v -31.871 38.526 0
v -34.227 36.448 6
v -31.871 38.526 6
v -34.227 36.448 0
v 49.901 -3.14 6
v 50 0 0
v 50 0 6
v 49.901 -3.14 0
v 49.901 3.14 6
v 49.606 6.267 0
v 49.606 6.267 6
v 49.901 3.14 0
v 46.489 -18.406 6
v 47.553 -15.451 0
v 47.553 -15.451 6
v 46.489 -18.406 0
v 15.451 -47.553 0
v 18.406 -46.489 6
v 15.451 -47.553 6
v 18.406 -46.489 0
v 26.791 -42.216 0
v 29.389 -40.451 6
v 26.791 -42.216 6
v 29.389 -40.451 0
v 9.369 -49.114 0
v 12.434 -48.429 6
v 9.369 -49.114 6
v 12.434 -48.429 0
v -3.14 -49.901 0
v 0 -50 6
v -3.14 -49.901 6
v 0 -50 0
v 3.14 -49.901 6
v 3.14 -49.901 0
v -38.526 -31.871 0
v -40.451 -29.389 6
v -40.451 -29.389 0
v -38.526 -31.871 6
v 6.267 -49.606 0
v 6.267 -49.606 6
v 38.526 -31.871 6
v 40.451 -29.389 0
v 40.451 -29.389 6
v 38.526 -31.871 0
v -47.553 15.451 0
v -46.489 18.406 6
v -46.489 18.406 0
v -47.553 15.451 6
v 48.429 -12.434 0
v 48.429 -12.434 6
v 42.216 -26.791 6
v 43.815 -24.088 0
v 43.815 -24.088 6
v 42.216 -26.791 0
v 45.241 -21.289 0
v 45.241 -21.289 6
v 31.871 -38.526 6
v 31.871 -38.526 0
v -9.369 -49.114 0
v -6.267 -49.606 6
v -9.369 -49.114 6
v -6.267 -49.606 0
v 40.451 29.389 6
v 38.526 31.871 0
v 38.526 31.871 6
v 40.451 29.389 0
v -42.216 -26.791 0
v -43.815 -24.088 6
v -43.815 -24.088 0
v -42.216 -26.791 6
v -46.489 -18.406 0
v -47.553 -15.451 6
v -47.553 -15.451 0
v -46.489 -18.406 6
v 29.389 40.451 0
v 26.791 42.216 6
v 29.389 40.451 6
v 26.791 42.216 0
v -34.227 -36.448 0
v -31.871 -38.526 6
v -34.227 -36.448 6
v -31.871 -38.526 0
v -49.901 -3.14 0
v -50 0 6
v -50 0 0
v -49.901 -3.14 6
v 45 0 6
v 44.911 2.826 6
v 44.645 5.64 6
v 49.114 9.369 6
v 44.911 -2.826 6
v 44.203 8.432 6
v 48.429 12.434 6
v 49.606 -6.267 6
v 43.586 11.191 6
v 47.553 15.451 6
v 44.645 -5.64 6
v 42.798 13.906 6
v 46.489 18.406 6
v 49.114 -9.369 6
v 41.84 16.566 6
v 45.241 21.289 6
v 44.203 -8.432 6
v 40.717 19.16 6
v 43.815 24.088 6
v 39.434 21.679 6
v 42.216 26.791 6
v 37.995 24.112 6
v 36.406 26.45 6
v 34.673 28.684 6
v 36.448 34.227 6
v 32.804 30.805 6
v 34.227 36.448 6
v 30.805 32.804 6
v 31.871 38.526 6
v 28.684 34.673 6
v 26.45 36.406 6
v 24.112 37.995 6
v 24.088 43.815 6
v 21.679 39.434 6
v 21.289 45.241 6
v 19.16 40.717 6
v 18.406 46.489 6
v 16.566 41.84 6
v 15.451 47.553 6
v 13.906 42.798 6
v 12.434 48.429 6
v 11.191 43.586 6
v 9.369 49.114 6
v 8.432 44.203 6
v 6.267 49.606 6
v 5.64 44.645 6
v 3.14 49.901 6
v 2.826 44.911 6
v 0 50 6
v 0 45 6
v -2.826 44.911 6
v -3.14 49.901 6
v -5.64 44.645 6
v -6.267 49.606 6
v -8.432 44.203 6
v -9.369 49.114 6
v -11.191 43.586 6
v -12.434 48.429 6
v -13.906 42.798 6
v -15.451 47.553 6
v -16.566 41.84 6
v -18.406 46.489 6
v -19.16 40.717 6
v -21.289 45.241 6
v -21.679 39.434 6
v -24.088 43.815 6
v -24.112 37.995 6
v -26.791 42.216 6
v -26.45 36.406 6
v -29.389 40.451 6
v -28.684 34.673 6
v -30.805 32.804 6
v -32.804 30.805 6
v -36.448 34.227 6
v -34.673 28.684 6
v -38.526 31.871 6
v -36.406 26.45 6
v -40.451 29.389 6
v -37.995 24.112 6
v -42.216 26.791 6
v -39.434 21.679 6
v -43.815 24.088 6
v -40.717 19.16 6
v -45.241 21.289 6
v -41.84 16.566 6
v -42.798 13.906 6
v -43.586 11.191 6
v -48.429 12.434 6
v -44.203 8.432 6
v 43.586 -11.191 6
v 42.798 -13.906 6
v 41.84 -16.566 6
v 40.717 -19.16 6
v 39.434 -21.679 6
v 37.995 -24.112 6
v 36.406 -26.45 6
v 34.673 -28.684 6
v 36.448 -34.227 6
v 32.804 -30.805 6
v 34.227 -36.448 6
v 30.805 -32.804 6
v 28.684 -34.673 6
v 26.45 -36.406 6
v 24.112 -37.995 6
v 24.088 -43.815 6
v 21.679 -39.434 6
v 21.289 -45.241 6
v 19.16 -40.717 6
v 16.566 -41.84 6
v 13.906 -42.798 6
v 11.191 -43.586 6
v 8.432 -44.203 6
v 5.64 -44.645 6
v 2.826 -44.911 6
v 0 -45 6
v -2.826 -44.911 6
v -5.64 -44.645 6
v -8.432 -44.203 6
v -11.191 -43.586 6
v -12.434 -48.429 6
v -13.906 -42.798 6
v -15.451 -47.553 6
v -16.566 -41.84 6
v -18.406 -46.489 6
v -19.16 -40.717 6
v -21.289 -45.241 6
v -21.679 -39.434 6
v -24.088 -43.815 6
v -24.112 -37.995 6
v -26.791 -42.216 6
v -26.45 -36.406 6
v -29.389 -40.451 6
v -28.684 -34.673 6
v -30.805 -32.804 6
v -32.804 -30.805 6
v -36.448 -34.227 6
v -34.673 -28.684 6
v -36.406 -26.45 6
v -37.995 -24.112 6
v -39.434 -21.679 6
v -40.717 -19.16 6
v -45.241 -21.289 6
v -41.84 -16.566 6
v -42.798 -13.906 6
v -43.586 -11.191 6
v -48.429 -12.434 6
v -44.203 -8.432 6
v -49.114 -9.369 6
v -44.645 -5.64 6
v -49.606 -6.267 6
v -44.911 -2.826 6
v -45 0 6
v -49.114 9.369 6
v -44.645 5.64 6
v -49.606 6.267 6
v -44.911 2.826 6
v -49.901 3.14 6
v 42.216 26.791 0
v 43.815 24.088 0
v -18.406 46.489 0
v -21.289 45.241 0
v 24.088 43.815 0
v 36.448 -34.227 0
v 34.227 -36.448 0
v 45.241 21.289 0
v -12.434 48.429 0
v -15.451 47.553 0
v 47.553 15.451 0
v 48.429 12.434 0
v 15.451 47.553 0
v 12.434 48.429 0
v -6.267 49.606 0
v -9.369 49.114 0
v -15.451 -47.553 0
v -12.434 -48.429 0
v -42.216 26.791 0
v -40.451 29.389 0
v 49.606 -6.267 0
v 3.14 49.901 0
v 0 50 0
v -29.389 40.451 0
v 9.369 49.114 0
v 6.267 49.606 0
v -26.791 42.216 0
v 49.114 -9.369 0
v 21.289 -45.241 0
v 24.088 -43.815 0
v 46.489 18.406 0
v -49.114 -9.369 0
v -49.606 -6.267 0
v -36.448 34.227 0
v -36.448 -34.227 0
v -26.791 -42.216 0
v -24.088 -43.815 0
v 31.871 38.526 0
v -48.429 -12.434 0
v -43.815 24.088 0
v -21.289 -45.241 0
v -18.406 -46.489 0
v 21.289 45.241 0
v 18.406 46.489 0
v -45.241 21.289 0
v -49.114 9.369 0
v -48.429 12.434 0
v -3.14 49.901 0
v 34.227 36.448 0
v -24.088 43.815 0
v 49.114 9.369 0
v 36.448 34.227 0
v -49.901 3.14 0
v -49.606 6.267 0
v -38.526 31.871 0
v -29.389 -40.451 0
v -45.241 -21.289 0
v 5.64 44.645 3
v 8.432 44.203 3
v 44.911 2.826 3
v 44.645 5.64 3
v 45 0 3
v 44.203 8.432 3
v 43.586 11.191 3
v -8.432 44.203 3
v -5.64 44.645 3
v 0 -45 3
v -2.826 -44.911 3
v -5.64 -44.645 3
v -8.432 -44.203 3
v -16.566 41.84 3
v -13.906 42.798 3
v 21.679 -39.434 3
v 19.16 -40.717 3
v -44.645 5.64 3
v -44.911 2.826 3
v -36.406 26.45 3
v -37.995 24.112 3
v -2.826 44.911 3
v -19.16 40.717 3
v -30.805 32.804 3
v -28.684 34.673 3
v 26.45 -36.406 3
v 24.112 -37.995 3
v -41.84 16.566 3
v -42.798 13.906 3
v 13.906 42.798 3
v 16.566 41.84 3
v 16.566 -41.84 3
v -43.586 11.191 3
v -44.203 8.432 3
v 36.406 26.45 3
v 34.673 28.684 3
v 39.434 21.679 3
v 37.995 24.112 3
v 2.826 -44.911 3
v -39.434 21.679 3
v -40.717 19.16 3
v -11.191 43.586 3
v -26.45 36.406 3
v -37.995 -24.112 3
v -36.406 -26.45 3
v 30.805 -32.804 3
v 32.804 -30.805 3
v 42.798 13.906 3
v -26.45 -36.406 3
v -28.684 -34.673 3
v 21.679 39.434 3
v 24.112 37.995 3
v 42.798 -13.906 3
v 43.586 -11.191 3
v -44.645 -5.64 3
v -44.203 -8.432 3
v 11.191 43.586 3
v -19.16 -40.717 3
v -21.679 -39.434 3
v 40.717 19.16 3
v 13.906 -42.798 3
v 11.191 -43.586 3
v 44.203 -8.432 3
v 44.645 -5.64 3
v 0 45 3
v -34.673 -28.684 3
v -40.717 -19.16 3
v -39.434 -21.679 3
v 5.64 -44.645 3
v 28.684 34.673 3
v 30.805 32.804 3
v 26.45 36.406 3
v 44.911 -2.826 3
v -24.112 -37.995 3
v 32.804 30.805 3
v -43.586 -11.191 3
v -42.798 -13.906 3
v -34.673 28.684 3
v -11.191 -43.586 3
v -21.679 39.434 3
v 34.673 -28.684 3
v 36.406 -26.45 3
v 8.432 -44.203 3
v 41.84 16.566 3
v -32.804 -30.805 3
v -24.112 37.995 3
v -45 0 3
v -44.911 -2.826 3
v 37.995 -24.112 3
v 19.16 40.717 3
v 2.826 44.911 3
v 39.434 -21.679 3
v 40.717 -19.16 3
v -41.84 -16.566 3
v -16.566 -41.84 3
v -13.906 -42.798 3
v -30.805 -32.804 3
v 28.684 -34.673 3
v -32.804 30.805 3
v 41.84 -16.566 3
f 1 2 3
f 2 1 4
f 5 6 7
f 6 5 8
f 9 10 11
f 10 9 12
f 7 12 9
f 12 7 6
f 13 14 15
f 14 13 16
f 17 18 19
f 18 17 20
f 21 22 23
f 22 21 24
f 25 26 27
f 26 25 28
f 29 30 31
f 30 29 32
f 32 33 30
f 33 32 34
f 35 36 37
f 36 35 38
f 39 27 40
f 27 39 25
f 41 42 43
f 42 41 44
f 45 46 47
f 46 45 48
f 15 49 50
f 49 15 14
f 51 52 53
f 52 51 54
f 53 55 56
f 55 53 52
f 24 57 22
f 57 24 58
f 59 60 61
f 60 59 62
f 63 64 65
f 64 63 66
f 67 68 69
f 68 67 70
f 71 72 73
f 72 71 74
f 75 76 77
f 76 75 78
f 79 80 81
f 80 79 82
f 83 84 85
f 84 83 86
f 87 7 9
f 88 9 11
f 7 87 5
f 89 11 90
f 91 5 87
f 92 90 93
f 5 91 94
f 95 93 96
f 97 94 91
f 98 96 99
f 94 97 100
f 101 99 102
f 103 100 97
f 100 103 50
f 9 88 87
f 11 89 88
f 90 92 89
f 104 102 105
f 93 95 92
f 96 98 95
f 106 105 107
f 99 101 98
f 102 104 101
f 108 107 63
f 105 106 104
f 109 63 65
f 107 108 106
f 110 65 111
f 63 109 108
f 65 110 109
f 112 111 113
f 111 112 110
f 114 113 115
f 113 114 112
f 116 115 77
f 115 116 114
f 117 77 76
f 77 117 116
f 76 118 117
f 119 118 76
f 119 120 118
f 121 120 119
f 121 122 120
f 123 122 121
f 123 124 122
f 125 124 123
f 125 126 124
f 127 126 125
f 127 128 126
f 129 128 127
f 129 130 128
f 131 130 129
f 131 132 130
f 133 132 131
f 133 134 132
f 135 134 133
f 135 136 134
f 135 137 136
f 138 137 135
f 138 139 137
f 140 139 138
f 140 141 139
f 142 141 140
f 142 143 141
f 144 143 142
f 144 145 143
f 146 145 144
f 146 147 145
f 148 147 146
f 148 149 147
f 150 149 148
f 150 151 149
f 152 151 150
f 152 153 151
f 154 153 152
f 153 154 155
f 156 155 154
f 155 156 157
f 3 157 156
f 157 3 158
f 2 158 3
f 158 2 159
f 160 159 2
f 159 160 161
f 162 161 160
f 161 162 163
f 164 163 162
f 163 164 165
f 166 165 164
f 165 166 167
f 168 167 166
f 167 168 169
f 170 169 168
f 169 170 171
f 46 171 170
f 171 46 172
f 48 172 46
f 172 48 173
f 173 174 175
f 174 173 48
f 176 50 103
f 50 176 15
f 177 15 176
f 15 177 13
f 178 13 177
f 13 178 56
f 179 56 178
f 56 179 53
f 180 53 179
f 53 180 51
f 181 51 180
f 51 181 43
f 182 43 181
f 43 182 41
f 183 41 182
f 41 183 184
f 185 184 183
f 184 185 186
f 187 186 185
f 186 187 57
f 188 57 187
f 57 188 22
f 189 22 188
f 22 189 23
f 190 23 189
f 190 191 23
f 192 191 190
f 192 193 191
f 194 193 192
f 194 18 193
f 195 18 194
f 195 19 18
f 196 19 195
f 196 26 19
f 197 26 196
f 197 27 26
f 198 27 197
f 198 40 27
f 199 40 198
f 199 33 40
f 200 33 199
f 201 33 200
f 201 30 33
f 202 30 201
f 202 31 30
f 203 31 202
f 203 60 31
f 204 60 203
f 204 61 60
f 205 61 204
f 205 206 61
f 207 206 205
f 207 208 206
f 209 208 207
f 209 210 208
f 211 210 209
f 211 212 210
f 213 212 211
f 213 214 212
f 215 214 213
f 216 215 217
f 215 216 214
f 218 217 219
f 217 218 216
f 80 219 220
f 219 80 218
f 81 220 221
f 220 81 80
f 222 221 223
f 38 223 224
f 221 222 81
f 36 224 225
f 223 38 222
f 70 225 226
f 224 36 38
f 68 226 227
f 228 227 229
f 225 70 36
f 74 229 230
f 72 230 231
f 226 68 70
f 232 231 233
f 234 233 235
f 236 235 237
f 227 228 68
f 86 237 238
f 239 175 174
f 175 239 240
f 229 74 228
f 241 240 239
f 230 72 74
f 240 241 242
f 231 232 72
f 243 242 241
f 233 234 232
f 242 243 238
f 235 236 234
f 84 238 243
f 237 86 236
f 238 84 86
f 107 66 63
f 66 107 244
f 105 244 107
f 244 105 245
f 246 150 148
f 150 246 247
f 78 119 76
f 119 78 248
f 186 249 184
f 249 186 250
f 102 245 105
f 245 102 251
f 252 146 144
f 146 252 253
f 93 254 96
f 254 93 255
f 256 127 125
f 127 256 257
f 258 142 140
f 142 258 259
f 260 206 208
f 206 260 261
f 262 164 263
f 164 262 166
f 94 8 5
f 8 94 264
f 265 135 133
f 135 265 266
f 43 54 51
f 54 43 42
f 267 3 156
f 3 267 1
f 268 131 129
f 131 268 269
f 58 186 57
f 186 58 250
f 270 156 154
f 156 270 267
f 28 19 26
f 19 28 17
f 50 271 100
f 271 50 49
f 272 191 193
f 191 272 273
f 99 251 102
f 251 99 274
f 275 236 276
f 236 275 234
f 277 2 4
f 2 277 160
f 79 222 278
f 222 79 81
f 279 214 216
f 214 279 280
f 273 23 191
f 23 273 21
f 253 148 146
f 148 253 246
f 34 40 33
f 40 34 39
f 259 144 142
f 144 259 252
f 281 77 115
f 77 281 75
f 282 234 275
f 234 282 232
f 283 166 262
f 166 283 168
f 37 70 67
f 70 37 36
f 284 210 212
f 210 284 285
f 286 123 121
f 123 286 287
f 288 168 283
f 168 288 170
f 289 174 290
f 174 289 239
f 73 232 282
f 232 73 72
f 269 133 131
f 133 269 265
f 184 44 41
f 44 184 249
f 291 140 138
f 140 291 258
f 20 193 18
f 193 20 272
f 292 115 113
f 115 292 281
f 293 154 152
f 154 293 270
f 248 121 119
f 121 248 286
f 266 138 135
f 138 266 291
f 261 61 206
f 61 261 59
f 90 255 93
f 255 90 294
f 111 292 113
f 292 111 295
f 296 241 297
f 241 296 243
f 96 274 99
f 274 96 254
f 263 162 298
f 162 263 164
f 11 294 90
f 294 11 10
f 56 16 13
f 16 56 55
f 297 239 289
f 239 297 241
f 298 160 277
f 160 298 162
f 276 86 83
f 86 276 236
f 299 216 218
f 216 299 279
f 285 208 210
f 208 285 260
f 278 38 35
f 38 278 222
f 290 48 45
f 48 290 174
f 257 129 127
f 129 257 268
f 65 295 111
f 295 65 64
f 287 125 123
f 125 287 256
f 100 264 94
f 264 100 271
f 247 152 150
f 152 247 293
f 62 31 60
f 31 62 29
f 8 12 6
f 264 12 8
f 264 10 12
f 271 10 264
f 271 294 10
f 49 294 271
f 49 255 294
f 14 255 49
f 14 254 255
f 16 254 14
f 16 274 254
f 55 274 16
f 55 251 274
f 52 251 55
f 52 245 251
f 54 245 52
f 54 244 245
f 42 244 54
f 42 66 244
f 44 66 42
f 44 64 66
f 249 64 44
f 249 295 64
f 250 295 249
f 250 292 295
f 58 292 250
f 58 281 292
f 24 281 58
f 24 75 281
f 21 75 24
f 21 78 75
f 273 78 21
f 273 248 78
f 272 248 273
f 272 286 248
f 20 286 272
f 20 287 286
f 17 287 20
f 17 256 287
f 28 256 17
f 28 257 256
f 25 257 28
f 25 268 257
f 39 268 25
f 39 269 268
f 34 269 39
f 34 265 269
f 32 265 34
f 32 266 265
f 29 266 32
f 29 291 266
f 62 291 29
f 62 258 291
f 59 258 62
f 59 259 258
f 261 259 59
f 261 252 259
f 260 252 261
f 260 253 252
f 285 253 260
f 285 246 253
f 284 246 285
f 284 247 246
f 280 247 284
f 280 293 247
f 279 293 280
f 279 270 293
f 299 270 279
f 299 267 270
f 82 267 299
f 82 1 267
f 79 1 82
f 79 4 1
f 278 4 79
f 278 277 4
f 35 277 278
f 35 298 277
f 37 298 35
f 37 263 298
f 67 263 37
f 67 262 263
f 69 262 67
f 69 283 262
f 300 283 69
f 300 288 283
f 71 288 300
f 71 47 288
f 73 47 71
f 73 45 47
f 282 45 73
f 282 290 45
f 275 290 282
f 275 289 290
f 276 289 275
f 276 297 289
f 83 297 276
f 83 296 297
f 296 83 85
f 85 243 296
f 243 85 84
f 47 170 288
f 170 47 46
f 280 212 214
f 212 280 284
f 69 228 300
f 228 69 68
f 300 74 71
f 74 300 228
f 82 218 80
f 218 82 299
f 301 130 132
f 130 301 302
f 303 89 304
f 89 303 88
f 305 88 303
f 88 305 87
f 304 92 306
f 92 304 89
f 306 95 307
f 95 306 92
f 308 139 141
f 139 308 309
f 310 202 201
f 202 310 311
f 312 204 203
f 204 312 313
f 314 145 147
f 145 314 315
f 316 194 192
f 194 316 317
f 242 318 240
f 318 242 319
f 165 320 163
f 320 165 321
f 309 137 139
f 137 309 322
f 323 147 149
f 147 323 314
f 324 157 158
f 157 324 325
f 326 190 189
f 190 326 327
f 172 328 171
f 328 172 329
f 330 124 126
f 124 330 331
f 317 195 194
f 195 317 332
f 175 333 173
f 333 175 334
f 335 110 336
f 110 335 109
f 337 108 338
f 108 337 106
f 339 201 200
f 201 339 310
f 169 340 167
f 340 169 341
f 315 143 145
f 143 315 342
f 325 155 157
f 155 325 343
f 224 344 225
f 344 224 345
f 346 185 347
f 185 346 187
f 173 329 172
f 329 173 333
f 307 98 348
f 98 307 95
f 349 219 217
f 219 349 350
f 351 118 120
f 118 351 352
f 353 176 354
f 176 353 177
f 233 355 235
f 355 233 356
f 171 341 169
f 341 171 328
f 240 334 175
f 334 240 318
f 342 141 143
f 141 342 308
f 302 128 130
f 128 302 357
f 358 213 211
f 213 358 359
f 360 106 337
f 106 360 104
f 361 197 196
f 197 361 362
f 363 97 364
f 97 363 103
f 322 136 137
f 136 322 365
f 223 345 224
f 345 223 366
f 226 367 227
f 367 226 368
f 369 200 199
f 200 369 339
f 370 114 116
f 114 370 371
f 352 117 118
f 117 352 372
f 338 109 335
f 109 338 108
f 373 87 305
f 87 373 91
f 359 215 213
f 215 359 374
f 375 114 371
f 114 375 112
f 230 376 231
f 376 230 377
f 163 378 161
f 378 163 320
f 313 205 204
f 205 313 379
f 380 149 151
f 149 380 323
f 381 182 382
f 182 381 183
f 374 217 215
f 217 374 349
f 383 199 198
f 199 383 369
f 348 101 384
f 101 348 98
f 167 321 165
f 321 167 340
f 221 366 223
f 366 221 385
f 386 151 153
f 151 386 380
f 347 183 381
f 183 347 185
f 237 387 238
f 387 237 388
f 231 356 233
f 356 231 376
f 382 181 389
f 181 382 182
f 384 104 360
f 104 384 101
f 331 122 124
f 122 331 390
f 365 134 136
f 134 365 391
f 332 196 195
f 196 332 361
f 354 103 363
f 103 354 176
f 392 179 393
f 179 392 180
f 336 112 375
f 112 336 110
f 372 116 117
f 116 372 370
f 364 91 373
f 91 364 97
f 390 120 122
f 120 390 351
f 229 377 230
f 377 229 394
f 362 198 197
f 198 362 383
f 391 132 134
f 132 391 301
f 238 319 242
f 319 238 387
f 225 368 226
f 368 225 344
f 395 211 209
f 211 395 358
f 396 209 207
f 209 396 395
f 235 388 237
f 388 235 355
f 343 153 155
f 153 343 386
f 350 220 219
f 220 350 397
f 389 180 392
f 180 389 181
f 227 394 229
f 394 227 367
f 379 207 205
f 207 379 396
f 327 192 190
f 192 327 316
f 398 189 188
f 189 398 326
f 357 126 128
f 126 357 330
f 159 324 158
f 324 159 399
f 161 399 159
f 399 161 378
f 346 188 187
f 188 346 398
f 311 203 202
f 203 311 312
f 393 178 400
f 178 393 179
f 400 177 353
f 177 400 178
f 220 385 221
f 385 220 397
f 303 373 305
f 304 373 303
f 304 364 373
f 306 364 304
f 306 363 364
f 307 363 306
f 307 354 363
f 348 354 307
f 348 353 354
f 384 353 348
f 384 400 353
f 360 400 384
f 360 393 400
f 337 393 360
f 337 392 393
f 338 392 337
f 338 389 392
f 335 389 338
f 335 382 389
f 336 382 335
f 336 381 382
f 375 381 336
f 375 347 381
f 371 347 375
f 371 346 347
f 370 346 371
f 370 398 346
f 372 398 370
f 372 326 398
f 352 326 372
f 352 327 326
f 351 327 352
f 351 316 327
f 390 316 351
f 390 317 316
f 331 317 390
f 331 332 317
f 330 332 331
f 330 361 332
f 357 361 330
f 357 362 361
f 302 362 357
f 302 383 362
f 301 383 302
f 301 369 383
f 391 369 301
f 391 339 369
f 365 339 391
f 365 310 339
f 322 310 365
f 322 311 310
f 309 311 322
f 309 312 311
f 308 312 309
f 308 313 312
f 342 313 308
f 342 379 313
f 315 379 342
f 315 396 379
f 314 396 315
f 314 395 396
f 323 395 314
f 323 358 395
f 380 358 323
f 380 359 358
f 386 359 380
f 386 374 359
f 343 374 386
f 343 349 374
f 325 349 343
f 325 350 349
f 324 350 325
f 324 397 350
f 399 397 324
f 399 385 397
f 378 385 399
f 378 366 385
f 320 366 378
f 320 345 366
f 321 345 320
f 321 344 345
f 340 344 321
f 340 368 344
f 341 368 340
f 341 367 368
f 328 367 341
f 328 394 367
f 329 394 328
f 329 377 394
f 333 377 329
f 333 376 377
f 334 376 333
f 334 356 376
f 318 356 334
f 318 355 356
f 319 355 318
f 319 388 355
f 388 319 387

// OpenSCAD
inner_diameter = 90; // mm
outer_diameter = 100; // mm

base_height = 3; // mm
top_height = 6; // mm

$fn = 100;

module coaster() {
  difference() {
    cylinder(d = outer_diameter, h=top_height);
    translate([0, 0, base_height])
    cylinder(d = inner_diameter, h=top_height - base_height);
  }
}

coaster();
